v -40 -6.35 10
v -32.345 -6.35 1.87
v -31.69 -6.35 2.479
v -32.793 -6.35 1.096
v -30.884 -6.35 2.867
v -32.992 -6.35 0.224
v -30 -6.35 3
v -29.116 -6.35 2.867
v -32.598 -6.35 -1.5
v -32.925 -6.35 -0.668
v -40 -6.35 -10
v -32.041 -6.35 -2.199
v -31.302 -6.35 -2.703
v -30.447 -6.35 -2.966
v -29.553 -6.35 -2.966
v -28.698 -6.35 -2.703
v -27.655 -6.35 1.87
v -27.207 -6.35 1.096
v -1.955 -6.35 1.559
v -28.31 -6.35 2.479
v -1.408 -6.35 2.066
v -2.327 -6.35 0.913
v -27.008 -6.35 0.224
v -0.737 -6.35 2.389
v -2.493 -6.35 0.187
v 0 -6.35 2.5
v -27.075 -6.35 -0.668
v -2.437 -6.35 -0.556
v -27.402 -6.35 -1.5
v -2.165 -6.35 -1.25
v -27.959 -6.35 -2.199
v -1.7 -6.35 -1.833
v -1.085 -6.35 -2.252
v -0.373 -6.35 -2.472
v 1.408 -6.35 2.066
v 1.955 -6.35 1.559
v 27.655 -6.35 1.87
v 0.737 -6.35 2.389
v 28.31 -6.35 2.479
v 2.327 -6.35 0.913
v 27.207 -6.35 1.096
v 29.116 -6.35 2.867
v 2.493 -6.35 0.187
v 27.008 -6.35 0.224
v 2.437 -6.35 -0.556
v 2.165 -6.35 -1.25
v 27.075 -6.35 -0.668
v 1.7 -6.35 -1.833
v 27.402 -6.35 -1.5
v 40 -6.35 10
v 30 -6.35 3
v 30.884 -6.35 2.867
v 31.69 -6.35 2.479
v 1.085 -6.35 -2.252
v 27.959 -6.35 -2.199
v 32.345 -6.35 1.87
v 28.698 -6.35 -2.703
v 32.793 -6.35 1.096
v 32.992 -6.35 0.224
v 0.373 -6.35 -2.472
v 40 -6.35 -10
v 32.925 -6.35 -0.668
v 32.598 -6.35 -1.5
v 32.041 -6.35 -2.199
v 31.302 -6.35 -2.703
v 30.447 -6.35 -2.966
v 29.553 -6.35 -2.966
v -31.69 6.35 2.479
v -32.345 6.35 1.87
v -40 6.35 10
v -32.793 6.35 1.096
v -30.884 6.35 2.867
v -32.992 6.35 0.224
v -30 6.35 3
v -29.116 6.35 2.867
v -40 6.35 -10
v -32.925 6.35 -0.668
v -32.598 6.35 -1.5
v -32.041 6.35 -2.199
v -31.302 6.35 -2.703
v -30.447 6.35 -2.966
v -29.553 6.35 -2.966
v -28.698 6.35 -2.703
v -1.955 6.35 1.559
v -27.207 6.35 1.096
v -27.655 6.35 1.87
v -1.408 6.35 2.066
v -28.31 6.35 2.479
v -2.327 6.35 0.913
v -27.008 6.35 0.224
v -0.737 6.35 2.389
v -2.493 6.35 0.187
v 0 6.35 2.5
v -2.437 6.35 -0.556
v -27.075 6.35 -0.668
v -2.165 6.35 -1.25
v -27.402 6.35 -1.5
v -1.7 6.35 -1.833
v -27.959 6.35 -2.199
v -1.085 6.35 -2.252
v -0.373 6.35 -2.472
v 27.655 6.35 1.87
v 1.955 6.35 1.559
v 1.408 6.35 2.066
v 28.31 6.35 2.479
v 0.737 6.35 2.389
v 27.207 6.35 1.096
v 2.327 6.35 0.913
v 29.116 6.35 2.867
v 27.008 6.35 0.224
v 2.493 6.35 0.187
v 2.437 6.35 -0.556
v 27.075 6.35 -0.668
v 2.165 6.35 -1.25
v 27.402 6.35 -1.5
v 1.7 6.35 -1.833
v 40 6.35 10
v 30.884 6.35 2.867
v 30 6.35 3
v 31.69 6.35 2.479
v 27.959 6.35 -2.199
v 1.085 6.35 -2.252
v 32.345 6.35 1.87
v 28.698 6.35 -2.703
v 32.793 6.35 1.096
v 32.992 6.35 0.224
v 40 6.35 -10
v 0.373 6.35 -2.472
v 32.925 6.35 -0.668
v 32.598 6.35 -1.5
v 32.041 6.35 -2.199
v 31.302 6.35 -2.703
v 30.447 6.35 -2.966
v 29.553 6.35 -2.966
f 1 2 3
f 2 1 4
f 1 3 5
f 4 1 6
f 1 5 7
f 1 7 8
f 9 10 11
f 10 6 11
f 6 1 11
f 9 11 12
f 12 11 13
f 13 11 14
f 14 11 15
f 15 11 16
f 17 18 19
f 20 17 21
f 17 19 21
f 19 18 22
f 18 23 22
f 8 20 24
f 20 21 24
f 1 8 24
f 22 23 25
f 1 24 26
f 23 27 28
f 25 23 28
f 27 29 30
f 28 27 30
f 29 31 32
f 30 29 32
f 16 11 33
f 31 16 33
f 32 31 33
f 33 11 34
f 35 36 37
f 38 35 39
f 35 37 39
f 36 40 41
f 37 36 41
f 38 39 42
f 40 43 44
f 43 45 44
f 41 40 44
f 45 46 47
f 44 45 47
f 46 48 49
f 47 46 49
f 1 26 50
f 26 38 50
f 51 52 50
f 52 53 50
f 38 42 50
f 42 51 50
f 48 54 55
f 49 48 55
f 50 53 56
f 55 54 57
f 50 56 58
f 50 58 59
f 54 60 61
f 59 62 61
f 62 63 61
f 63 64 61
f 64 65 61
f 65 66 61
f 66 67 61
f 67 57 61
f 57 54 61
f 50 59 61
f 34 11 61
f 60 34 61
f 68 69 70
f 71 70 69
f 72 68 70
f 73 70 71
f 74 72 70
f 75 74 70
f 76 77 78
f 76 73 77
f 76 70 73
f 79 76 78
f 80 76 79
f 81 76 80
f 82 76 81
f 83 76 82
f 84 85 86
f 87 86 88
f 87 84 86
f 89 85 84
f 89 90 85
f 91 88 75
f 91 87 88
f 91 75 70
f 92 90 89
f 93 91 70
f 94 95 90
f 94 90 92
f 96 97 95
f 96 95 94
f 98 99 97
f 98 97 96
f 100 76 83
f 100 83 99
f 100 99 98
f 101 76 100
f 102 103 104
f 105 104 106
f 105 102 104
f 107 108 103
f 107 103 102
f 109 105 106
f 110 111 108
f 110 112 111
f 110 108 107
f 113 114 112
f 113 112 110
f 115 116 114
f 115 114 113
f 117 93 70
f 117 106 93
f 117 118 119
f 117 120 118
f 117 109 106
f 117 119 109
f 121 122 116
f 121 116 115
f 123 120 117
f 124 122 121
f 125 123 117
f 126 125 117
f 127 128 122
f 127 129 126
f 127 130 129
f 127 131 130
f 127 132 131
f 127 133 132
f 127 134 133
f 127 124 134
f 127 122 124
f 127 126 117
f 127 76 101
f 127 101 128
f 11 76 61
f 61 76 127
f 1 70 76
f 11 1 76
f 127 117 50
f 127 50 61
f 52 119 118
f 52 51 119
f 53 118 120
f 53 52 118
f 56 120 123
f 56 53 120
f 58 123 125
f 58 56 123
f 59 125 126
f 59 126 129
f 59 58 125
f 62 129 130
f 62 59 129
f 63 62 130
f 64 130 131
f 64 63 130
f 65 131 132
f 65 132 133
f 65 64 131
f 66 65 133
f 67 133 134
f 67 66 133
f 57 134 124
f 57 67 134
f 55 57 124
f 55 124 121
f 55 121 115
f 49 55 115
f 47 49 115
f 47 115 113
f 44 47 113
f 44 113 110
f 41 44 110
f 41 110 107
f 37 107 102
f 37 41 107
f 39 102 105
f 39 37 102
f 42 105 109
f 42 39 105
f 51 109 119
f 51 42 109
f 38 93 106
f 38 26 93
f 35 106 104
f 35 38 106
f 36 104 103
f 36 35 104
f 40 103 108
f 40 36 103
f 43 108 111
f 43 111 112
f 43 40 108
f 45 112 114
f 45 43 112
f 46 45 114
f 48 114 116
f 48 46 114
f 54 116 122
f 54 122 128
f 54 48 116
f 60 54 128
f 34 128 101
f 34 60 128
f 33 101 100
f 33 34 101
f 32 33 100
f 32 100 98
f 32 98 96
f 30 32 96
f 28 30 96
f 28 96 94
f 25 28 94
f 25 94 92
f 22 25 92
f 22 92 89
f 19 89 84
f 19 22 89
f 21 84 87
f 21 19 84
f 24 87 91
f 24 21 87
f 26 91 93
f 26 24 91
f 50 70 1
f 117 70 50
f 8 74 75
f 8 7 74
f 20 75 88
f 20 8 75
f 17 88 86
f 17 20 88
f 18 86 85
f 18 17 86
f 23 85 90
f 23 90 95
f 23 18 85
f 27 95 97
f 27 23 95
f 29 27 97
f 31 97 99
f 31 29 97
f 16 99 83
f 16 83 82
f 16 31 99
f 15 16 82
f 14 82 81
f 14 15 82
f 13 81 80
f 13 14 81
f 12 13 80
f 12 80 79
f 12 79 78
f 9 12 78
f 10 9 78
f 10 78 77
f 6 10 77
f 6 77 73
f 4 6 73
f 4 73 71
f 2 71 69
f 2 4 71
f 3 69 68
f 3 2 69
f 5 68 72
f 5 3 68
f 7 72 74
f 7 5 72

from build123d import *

# Parameters (mm, degrees)
SKETCH1_W           = 80
SKETCH1_H           = 20
SKETCH1_R           = 2.5
SKETCH1_R_2         = 3
BOSS_EXTRUDE1_DEPTH = 6.35


with BuildPart() as part:
    # Sketch1 → Boss-Extrude1 (new, symmetric)
    with BuildSketch(Plane(origin=(0, 0, 0), x_dir=(1, 0, 0), z_dir=(0, 1, 0))):
        Rectangle(SKETCH1_W, SKETCH1_H)
        with Locations(Location((0, 0, 0), (0, 0, 270))):
            Circle(SKETCH1_R, mode=Mode.SUBTRACT)
        with Locations(Location((-30, 0, 0), (0, 0, 270))):
            Circle(SKETCH1_R_2, mode=Mode.SUBTRACT)
        with Locations(Location((30, 0, 0), (0, 0, 270))):
            Circle(SKETCH1_R_2, mode=Mode.SUBTRACT)
    extrude(amount=BOSS_EXTRUDE1_DEPTH, both=True)


solid = part.part
